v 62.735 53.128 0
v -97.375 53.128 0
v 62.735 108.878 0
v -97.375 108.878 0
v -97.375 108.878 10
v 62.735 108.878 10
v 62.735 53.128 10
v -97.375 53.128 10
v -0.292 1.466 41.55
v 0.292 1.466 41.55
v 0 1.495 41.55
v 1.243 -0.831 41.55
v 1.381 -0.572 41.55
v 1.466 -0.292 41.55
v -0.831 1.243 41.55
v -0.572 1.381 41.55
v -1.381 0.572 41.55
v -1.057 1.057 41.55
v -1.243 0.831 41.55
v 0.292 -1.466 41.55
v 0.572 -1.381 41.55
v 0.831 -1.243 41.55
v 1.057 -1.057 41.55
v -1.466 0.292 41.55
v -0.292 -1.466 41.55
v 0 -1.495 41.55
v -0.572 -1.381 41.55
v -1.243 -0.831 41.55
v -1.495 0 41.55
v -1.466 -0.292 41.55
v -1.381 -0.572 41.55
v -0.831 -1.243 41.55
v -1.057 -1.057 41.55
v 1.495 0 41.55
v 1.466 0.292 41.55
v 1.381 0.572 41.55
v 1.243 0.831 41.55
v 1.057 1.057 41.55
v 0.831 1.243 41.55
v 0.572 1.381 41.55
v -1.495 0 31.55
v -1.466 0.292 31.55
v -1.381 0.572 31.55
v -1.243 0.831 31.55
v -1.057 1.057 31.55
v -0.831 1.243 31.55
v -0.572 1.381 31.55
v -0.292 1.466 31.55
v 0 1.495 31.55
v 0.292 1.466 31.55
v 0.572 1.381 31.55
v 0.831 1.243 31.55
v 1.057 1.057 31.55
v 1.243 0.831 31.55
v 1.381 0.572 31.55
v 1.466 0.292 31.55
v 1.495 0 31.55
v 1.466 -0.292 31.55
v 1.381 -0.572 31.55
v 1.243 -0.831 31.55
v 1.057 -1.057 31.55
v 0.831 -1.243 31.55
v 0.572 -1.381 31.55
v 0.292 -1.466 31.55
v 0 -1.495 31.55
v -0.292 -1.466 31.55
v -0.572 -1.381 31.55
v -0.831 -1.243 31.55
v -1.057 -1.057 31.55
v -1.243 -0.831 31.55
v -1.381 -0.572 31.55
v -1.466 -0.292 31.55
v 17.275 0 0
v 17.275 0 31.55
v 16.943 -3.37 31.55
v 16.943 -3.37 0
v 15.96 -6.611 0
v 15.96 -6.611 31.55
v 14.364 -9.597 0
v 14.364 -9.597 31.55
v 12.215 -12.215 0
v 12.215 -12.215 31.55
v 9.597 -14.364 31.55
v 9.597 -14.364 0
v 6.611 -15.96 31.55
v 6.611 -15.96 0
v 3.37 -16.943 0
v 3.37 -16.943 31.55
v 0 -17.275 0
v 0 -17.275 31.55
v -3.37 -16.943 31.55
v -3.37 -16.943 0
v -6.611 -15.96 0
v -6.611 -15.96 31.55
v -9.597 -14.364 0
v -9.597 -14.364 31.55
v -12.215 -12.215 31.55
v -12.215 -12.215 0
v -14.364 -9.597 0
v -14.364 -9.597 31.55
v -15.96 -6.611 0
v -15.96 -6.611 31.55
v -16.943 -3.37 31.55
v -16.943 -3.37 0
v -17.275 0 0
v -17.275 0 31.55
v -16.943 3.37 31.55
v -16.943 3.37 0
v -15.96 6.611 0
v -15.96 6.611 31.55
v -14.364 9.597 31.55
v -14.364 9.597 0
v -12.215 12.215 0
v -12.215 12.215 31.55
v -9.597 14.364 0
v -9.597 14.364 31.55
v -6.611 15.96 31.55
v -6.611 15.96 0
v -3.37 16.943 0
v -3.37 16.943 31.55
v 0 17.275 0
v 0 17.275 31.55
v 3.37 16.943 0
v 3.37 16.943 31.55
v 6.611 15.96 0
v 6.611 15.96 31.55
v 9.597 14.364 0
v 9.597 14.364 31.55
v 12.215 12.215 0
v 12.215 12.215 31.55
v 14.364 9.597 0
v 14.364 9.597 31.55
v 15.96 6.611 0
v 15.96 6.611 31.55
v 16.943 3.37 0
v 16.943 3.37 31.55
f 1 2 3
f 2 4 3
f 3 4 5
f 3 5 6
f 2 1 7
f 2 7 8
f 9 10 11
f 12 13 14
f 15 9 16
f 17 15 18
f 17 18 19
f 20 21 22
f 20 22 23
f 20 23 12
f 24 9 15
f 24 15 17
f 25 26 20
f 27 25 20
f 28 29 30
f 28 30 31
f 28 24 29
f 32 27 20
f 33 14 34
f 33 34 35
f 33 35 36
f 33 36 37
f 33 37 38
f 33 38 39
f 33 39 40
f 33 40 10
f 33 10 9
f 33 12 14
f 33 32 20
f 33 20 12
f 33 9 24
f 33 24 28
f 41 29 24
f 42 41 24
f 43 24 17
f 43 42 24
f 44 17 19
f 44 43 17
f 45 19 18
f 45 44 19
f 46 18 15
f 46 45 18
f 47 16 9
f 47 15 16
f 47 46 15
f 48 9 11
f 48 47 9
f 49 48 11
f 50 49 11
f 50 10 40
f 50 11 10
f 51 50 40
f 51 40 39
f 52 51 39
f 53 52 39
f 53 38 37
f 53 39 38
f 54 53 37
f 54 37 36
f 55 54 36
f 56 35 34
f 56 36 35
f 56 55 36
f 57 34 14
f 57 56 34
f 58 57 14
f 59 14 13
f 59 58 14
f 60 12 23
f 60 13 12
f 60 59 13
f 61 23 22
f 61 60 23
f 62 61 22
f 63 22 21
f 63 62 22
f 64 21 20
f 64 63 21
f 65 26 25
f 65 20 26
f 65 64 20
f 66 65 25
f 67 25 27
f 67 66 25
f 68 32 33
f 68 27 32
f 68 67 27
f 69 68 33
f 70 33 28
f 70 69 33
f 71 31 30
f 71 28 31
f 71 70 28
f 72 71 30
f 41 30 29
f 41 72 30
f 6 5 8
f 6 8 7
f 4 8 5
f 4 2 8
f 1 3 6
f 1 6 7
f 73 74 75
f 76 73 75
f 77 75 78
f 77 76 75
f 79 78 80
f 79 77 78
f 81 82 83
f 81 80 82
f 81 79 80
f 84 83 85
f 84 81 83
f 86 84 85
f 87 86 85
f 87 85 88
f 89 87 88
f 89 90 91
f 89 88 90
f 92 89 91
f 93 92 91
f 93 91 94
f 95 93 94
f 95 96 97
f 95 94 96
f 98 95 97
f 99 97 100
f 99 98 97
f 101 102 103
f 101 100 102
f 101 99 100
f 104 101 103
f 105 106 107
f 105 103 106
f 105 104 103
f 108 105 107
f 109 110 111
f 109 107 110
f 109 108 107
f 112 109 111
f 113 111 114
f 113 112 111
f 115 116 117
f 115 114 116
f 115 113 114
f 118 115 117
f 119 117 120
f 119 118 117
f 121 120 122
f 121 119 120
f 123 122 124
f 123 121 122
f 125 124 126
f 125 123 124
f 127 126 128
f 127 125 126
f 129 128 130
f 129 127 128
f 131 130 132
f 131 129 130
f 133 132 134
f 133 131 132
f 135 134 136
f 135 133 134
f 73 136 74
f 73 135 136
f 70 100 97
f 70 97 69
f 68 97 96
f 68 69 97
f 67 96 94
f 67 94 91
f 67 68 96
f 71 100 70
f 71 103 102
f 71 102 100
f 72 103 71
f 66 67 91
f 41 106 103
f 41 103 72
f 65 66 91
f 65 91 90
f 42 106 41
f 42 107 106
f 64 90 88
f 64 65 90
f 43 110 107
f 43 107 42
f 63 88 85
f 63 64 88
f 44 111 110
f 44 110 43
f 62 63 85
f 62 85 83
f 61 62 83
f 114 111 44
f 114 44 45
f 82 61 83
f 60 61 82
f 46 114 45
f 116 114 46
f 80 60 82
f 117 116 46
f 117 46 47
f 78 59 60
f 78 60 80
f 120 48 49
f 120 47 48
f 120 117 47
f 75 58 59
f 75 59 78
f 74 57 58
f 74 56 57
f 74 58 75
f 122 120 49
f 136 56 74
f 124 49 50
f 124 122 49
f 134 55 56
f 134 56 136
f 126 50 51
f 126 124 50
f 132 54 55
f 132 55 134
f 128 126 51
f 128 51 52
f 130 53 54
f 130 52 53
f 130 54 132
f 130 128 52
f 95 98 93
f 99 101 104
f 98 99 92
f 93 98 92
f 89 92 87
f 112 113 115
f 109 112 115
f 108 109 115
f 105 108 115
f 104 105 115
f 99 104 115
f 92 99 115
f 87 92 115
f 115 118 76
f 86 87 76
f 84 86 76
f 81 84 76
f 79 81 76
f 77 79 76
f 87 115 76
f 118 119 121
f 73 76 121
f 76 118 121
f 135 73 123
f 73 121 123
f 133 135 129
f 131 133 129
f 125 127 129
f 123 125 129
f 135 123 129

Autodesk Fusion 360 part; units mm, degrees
sketch "Sketch1" plane through (0, 0, 0) normal (0, 0, 1) x (1, 0, 0)
  circle A0 centre (0, 0) radius 17.275
  dimension "d1" = 34.55
extrude "Extrude1" add sketch "Sketch1" along normal blind 31.55 makes body 1
sketch "Sketch2" plane through (0, 0, 31.55) normal (0, 0, 1) x (-1, 0, 0)
  circle A0 centre (0, 0) radius 17.275
  circle A1 centre (0, 0) radius 1.495
  dimension "d4" = 2.99
extrude "Extrude2" add sketch "Sketch2" along normal blind 10 contours A1 bodies 1
sketch "Sketch3" plane through (0, 0, 0) normal (0, 0, 1) x (1, 0, 0)
  line L0 (62.7346, 53.1278) -> (-97.3754, 53.1278)
  line L1 (-97.3754, 53.1278) -> (-97.3754, 108.8778)
  line L2 (-97.3754, 108.8778) -> (62.7346, 108.8778)
  line L3 (62.7346, 108.8778) -> (62.7346, 53.1278)
  dimension "d7" = 160.11
  dimension "d8" = 55.75
extrude "Extrude3" add sketch "Sketch3" along normal blind 10 separate body makes body 2
